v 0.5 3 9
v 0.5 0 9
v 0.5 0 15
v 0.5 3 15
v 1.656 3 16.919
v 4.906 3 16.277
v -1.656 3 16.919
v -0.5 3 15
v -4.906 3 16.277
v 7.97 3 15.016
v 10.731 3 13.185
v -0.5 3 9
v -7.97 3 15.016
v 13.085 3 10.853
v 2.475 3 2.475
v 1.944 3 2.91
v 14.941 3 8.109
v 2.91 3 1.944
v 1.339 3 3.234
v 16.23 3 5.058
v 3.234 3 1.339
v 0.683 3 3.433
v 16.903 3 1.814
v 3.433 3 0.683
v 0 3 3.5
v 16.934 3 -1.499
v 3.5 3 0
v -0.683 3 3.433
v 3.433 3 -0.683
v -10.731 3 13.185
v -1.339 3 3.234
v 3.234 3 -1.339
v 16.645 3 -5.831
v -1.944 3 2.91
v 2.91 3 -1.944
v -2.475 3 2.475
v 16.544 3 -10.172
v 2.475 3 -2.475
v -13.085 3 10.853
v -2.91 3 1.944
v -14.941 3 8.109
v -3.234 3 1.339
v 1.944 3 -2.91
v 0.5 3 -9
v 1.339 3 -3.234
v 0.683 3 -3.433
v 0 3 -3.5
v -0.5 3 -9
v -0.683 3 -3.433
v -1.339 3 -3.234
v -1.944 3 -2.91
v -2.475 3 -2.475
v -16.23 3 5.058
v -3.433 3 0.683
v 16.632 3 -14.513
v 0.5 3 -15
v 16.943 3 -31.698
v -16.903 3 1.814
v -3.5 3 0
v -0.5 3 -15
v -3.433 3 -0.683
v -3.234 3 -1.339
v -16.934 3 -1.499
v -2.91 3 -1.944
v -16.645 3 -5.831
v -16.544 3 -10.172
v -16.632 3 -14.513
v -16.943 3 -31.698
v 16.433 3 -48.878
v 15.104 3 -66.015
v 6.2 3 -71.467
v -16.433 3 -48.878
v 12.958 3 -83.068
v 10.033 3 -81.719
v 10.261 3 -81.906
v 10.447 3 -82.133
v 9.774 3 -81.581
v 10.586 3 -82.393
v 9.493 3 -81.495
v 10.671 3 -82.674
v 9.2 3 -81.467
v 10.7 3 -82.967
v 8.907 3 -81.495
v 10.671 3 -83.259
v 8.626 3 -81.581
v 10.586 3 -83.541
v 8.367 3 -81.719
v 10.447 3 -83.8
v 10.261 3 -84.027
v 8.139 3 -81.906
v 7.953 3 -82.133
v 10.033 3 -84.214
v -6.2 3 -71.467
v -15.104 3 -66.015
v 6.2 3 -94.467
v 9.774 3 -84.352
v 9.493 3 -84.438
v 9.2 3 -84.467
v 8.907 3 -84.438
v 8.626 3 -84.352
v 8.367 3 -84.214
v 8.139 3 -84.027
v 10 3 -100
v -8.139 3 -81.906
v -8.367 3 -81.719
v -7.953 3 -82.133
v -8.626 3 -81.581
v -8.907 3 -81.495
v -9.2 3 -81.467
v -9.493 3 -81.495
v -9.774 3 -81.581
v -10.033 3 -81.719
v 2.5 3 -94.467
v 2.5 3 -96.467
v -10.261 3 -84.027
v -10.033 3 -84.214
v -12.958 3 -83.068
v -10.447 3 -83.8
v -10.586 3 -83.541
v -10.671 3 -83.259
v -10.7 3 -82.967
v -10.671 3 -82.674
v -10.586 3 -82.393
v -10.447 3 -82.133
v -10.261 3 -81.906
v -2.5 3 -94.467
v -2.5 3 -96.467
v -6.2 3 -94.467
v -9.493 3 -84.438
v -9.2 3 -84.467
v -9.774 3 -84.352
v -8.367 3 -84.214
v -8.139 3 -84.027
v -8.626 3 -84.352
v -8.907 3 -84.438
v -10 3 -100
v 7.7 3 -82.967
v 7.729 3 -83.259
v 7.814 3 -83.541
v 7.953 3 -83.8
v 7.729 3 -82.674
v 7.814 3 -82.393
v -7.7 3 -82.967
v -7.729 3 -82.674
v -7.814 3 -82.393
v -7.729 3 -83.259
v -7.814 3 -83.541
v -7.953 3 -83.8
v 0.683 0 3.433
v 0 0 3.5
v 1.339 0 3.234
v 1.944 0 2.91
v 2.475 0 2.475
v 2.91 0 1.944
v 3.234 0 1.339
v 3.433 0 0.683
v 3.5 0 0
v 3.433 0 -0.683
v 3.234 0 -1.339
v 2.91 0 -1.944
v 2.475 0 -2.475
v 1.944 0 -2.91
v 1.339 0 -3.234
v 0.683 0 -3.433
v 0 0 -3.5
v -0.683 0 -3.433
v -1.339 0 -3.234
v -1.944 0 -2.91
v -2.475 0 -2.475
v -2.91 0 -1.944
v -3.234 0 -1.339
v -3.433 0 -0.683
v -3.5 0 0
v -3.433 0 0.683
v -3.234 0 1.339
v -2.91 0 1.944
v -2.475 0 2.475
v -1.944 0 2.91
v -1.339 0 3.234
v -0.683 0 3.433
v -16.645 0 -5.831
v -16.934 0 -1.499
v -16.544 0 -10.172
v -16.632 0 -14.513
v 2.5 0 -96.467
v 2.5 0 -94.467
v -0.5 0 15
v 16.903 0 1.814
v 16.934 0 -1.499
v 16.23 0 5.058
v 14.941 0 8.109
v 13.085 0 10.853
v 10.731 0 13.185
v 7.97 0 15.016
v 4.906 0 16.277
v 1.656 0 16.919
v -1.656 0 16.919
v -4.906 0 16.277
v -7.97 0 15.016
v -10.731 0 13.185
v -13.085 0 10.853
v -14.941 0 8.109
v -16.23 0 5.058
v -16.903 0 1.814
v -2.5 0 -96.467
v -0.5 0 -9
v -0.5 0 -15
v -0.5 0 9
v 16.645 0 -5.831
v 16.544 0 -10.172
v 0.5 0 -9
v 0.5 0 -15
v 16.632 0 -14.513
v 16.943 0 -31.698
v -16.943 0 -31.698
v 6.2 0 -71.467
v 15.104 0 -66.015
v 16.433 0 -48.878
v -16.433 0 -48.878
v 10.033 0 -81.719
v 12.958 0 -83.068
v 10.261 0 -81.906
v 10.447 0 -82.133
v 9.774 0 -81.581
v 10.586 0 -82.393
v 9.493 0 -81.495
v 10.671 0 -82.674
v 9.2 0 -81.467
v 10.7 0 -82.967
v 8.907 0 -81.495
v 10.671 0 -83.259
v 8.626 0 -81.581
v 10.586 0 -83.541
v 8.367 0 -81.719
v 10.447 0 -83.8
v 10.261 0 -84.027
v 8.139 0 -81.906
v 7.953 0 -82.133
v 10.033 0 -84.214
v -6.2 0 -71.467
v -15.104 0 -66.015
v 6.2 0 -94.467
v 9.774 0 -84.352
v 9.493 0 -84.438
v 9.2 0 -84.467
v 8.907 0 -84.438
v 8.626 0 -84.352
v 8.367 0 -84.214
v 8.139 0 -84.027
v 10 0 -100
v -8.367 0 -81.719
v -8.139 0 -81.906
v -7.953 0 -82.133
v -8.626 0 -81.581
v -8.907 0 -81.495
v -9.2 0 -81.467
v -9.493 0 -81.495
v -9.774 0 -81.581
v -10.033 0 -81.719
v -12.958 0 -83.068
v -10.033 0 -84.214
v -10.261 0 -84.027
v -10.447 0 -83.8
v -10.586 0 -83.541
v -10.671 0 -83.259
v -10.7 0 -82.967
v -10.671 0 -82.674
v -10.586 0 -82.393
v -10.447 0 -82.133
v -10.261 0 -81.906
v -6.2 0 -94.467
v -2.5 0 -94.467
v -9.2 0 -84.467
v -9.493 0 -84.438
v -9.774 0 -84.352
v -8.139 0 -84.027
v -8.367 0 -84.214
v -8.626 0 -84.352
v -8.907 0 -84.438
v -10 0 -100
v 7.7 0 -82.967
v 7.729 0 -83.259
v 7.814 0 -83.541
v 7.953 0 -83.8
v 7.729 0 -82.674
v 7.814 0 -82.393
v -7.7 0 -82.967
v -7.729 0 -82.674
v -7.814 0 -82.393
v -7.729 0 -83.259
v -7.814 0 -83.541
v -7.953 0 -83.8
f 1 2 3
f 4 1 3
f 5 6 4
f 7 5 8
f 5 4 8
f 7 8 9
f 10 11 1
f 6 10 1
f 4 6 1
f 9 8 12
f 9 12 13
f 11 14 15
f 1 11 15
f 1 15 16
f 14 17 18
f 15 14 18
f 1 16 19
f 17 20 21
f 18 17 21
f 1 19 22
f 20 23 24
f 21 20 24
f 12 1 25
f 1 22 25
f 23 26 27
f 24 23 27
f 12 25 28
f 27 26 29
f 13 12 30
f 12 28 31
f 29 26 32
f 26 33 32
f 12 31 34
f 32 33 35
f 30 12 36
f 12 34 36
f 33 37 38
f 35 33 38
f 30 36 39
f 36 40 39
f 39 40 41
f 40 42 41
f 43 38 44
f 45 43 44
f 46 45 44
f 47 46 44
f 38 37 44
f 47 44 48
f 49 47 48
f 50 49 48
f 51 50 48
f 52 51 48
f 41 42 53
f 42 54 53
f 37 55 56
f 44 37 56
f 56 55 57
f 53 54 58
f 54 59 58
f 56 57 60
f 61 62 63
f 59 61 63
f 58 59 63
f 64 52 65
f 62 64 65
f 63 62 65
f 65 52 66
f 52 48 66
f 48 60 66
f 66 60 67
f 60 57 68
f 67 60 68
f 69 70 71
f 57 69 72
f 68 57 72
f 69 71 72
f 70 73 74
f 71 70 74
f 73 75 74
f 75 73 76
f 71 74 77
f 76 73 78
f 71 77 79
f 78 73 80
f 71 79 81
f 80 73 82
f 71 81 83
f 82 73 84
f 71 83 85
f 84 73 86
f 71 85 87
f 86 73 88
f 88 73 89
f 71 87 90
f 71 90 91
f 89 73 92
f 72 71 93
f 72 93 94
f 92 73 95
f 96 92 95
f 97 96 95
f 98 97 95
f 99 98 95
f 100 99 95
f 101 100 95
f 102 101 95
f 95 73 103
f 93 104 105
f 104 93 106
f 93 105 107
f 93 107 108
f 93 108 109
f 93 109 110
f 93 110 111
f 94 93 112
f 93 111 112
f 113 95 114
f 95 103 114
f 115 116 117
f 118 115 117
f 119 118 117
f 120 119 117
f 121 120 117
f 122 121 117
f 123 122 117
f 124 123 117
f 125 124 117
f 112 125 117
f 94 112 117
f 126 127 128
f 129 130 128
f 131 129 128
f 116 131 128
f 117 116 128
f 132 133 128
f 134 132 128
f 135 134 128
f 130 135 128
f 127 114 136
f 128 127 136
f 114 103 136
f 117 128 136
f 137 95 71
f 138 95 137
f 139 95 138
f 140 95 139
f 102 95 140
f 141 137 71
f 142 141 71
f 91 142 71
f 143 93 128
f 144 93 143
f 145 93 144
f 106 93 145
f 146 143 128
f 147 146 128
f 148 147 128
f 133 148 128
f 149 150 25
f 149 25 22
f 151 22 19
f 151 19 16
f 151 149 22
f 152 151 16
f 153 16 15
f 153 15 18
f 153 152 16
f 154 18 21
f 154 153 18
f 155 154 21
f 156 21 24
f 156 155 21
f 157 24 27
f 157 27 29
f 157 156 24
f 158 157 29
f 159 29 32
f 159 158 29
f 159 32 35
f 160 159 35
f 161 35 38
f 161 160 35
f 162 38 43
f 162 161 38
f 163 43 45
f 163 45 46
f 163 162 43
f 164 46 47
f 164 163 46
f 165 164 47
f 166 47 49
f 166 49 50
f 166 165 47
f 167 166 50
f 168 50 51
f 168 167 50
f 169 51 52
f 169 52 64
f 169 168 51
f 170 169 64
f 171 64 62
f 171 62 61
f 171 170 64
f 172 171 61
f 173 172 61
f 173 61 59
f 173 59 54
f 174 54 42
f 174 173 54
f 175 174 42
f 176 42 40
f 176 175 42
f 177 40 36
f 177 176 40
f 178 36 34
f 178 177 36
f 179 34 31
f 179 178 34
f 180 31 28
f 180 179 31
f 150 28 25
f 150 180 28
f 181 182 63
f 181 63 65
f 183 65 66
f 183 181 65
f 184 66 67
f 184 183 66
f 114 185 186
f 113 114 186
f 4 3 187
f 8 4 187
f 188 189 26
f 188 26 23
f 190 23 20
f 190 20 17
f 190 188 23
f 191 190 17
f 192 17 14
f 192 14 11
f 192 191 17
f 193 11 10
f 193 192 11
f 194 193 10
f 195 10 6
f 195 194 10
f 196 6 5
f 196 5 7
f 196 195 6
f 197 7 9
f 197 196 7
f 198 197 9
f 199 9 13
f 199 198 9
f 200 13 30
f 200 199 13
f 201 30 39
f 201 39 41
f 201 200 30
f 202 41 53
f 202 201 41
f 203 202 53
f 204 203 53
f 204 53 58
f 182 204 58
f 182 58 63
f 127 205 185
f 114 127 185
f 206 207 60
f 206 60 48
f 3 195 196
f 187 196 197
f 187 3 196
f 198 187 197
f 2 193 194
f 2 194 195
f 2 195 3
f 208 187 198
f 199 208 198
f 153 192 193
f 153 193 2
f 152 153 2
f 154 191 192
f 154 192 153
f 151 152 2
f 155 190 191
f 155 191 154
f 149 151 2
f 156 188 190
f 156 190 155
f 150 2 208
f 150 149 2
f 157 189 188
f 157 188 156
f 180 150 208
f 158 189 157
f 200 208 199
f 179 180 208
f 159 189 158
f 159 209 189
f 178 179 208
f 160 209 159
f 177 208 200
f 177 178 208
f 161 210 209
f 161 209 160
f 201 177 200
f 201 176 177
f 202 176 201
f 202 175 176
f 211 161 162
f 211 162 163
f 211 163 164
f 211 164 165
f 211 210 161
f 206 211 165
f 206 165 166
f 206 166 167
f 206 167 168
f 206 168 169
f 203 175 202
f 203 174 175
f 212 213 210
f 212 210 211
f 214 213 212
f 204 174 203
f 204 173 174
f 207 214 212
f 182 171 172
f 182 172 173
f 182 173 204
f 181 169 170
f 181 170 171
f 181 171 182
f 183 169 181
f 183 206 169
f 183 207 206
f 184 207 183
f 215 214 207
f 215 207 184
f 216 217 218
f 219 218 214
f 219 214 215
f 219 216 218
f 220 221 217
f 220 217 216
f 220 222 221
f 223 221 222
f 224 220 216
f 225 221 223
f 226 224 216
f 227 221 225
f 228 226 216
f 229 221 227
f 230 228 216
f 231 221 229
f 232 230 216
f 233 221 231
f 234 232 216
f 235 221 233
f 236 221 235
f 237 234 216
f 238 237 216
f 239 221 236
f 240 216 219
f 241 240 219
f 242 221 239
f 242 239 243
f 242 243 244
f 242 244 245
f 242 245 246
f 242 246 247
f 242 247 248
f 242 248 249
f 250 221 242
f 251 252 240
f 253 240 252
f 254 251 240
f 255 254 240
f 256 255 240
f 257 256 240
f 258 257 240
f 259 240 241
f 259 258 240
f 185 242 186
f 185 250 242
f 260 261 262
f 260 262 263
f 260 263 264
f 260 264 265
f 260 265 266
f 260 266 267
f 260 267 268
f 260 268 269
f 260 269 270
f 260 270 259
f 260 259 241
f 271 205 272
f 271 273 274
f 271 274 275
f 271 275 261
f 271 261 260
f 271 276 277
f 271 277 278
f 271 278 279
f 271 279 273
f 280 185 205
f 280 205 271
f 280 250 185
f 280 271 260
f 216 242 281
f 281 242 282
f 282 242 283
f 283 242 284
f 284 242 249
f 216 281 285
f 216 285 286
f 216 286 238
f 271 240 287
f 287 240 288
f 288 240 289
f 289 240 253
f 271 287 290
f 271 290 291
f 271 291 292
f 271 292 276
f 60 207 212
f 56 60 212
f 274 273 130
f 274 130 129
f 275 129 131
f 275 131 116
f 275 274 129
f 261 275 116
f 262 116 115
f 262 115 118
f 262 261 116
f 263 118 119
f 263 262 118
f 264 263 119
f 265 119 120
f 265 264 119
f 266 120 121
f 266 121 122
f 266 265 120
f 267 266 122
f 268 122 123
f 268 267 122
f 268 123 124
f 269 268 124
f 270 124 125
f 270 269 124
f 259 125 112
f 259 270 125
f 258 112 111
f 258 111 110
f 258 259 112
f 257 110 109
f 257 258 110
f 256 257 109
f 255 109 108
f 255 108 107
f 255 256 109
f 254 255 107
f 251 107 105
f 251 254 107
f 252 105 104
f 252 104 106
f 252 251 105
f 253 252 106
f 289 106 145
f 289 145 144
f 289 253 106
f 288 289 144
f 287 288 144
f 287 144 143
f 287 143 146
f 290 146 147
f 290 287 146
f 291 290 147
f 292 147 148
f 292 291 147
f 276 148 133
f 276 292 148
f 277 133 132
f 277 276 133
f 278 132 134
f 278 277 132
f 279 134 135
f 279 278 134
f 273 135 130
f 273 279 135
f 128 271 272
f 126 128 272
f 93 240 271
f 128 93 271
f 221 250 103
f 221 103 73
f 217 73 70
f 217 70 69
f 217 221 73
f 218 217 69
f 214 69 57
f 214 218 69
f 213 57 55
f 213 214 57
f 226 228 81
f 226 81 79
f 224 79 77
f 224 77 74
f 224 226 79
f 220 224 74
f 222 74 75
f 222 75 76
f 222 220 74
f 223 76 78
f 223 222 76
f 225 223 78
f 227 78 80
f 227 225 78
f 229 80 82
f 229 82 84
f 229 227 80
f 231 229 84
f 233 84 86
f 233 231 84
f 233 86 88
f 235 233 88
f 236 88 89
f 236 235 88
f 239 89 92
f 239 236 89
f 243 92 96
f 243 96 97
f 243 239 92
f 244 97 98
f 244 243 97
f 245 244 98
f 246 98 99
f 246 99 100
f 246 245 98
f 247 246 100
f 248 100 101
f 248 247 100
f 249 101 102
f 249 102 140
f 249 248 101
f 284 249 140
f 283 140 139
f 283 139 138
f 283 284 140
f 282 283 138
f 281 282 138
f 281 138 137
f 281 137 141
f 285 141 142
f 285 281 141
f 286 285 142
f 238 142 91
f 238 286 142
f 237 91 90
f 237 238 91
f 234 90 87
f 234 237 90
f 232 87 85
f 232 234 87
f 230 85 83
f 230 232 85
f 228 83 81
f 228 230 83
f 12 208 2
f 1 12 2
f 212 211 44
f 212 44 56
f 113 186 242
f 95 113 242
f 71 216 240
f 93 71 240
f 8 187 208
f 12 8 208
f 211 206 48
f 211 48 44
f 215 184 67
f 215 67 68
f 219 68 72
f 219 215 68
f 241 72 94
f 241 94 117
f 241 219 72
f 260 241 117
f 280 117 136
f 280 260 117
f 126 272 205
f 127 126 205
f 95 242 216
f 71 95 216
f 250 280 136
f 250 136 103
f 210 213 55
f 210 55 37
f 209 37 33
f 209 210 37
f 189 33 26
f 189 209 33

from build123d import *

# Parameters (mm, degrees)
ESBO_O4_R                = 3.5
ESBO_O4_R_2              = 1.5
RESSALTO_EXTRUS_O1_DEPTH = 3


with BuildPart() as part:
    # Esboço4 → Ressalto-extrusão1 (new body)
    with BuildSketch(Plane(origin=(0, 0, 0), x_dir=(1, 0, 0), z_dir=(0, 1, 0))):
        with BuildLine():
            Line((0, 100), (10, 100))
            ThreePointArc((10, 100), (15.870896117, 57.454662802), (16.6322809, 14.512918173))
            ThreePointArc((16.6322809, 14.512918173), (16.571046781, 8.001087588), (16.933775774, 1.499079062))
            ThreePointArc((16.933775774, 1.499079062), (0, -17), (-16.933775774, 1.499079062))
            ThreePointArc((-16.933775774, 1.499079062), (-16.571046781, 8.001087588), (-16.6322809, 14.512918173))
            ThreePointArc((-16.6322809, 14.512918173), (-15.870896117, 57.454662802), (-10, 100))
            Line((-10, 100), (0, 100))
        make_face()
        with Locations(Location((0, 0, 0), (0, 0, 270))):
            Circle(ESBO_O4_R, mode=Mode.SUBTRACT)
        with Locations(Location((9.2, 82.966613318, 0), (0, 0, 270))):
            Circle(ESBO_O4_R_2, mode=Mode.SUBTRACT)
        with Locations(Location((-9.2, 82.966613318, 0), (0, 0, 90))):
            Circle(ESBO_O4_R_2, mode=Mode.SUBTRACT)
        Polygon((6.2, 94.466613318), (6.2, 71.466613318), (-6.2, 71.466613318), (-6.2, 94.466613318), (-2.5, 94.466613318), (-2.5, 96.466613318), (2.5, 96.466613318), (2.5, 94.466613318), align=None, mode=Mode.SUBTRACT)
        Polygon((0, -15), (-0.5, -15), (-0.5, -9), (0.5, -9), (0.5, -15), align=None, mode=Mode.SUBTRACT)
        Polygon((0.5, 15), (0, 15), (-0.5, 15), (-0.5, 9), (0.5, 9), align=None, mode=Mode.SUBTRACT)
    extrude(amount=RESSALTO_EXTRUS_O1_DEPTH)


solid = part.part
